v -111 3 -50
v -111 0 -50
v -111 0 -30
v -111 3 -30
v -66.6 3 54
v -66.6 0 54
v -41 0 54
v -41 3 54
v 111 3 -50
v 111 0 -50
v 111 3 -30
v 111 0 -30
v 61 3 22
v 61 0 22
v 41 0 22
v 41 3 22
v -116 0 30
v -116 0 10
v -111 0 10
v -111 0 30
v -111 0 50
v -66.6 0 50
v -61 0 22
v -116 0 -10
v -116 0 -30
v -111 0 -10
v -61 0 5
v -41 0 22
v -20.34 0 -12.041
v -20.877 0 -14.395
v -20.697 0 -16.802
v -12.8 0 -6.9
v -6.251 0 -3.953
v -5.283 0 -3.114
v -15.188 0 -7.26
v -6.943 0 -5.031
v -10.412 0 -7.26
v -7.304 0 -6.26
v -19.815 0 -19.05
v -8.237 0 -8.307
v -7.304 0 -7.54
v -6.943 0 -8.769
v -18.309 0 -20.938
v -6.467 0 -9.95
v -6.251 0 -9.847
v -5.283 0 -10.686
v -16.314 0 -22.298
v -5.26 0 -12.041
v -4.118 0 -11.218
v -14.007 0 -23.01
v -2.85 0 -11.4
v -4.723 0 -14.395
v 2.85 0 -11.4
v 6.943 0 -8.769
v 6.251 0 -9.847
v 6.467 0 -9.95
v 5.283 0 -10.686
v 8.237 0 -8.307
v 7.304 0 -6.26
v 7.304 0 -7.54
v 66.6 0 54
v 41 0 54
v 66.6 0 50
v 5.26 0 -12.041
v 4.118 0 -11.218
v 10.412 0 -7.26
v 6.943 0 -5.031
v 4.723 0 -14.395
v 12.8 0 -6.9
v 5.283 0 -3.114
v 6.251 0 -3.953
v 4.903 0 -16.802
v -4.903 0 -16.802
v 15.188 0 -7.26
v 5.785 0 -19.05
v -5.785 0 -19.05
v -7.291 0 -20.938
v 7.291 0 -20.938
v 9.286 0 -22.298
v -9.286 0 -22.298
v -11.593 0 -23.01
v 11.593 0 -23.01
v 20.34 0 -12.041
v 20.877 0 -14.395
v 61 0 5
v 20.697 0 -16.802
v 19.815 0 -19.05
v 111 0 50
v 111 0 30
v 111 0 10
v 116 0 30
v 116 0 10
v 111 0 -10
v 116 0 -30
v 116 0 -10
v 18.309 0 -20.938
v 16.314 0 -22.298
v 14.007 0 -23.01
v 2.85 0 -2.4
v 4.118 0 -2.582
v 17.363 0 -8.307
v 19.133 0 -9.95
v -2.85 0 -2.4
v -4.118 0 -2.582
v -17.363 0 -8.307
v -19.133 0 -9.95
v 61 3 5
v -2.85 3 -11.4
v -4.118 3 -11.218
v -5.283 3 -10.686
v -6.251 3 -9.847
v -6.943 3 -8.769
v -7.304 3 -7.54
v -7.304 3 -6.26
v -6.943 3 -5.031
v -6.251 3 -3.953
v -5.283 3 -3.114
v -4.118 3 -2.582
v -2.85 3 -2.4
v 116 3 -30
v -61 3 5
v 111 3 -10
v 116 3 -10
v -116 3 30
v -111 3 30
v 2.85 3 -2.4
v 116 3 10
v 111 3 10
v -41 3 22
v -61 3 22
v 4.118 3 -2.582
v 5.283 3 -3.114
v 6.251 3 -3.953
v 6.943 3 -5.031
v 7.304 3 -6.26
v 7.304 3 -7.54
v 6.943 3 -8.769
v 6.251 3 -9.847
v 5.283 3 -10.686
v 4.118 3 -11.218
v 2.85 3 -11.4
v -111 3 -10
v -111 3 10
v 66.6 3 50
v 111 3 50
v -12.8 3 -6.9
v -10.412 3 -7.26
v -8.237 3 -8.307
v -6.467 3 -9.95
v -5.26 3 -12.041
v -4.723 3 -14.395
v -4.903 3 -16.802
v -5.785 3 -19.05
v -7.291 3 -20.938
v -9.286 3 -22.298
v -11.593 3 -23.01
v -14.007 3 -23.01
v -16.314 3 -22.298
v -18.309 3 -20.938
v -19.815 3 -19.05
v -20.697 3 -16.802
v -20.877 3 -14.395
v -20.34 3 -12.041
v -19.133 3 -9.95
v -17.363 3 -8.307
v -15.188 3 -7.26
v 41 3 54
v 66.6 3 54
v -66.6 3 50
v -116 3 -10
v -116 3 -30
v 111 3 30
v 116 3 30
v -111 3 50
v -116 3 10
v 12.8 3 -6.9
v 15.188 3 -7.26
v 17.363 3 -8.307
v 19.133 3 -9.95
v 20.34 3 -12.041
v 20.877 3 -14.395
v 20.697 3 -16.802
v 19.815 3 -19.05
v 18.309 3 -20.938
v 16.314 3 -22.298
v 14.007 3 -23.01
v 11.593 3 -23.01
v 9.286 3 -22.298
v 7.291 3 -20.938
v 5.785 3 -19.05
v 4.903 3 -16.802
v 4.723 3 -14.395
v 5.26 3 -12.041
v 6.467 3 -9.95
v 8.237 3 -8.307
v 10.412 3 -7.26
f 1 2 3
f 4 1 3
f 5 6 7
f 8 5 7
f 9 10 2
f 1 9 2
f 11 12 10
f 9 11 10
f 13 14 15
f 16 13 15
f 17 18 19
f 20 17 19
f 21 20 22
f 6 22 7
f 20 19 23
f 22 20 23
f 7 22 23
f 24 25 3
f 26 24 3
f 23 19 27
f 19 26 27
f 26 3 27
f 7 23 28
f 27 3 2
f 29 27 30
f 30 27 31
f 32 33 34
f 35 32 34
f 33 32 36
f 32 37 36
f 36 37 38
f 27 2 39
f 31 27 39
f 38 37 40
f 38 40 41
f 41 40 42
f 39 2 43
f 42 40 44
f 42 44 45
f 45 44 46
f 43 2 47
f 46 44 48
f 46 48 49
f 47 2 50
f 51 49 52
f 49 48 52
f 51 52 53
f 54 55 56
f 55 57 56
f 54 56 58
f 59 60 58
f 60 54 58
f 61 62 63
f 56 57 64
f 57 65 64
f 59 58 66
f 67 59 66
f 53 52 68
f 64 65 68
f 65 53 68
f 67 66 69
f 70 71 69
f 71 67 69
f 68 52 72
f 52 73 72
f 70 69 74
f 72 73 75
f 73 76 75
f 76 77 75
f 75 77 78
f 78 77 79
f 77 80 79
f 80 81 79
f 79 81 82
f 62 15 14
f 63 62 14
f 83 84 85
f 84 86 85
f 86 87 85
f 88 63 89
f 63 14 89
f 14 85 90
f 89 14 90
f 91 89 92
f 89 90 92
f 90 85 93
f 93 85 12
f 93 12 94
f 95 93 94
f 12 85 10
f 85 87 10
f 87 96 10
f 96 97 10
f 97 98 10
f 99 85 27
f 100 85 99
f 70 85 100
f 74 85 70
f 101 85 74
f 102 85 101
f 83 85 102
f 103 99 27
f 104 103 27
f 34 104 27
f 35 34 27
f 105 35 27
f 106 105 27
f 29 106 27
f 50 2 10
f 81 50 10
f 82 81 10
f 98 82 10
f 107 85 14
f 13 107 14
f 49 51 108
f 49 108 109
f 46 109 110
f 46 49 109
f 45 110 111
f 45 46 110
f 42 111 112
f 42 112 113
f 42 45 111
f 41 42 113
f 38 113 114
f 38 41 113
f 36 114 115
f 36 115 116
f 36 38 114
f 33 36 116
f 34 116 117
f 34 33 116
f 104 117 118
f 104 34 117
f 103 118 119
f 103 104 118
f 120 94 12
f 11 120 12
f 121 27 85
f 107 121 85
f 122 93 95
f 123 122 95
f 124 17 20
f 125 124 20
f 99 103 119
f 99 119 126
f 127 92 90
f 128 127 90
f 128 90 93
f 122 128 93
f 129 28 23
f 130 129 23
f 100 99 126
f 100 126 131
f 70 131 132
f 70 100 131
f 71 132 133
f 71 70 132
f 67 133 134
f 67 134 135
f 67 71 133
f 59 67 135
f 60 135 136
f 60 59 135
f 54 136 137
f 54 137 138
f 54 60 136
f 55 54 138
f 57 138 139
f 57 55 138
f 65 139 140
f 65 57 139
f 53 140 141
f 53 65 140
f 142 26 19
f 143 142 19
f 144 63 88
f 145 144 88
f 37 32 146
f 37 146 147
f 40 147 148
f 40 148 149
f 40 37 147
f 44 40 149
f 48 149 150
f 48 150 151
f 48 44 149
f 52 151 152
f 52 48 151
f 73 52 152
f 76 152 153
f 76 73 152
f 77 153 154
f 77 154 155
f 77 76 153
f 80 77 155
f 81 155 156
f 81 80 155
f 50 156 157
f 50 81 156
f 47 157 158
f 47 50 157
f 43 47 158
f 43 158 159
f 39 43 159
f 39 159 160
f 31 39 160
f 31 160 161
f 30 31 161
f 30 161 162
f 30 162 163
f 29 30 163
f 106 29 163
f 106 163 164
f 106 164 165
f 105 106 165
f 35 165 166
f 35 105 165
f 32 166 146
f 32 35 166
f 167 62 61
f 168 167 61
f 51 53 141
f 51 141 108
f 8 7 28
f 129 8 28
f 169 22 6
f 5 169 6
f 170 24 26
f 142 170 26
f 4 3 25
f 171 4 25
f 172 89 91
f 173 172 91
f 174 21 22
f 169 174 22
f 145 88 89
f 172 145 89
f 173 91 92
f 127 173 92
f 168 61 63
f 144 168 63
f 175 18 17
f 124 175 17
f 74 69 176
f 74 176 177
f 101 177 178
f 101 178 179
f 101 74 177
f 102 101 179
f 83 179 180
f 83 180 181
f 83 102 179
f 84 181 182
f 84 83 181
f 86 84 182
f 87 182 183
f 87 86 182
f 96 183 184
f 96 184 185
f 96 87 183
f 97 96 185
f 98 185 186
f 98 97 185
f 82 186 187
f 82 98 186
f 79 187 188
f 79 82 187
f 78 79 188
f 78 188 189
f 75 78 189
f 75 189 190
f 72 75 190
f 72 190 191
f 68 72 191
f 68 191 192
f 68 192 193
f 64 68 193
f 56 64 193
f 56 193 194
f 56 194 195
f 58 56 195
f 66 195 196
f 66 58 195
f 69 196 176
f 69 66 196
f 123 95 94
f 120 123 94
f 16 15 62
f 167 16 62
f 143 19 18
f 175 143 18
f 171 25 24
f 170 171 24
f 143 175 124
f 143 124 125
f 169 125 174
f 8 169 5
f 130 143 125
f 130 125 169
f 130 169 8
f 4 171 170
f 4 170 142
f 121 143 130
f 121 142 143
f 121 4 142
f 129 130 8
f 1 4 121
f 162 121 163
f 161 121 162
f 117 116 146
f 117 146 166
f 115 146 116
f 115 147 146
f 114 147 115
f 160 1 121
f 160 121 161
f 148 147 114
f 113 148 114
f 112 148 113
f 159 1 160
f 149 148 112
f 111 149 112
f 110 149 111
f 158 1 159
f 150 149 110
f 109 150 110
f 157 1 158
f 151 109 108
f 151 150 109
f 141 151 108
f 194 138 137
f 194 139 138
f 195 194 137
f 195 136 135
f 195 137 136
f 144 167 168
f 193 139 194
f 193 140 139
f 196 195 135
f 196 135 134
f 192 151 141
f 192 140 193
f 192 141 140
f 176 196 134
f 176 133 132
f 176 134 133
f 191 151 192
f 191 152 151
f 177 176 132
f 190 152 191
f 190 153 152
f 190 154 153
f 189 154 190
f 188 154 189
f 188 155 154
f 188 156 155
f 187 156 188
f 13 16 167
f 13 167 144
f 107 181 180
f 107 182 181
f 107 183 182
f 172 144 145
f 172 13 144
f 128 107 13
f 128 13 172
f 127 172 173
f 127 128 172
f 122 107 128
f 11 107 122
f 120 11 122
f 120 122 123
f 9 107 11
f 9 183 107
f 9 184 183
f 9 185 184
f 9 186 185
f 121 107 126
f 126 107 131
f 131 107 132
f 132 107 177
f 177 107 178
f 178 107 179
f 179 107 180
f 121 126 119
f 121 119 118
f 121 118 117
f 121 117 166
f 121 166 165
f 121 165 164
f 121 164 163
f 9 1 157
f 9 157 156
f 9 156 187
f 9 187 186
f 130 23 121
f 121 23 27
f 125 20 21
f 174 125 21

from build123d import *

# Parameters (mm, degrees)
SKETCH1_R           = 8.1
BOSS_EXTRUDE1_DEPTH = 3


with BuildPart() as part:
    # Sketch1 → Boss-Extrude1 (new body)
    with BuildSketch(Plane(origin=(0, 0, 0), x_dir=(1, 0, 0), z_dir=(0, 1, 0))):
        Polygon((-111, 30), (-116, 30), (-116, 10), (-111, 10), (-111, -10), (-116, -10), (-116, -30), (-111, -30), (-111, -50), (-66.6, -50), (-66.6, -54), (-41, -54), (-41, -22), (-61, -22), (-61, -5), (-41, -5), (41, -5), (61, -5), (61, -22), (41, -22), (41, -54), (66.6, -54), (66.6, -50), (111, -50), (111, -30), (116, -30), (116, -10), (111, -10), (111, 10), (116, 10), (116, 30), (111, 30), (111, 50), (-111, 50), align=None)
        with Locations(Location((12.8, 15, 0), (0, 0, 270))):
            Circle(SKETCH1_R, mode=Mode.SUBTRACT)
        with Locations(Location((-12.8, 15, 0), (0, 0, 270))):
            Circle(SKETCH1_R, mode=Mode.SUBTRACT)
        with BuildLine():
            Line((-2.85, 2.4), (2.85, 2.4))
            ThreePointArc((2.85, 2.4), (7.35, 6.9), (2.85, 11.4))
            Line((2.85, 11.4), (-2.85, 11.4))
            ThreePointArc((-2.85, 11.4), (-7.35, 6.9), (-2.85, 2.4))
        make_face(mode=Mode.SUBTRACT)
    extrude(amount=BOSS_EXTRUDE1_DEPTH)


solid = part.part
